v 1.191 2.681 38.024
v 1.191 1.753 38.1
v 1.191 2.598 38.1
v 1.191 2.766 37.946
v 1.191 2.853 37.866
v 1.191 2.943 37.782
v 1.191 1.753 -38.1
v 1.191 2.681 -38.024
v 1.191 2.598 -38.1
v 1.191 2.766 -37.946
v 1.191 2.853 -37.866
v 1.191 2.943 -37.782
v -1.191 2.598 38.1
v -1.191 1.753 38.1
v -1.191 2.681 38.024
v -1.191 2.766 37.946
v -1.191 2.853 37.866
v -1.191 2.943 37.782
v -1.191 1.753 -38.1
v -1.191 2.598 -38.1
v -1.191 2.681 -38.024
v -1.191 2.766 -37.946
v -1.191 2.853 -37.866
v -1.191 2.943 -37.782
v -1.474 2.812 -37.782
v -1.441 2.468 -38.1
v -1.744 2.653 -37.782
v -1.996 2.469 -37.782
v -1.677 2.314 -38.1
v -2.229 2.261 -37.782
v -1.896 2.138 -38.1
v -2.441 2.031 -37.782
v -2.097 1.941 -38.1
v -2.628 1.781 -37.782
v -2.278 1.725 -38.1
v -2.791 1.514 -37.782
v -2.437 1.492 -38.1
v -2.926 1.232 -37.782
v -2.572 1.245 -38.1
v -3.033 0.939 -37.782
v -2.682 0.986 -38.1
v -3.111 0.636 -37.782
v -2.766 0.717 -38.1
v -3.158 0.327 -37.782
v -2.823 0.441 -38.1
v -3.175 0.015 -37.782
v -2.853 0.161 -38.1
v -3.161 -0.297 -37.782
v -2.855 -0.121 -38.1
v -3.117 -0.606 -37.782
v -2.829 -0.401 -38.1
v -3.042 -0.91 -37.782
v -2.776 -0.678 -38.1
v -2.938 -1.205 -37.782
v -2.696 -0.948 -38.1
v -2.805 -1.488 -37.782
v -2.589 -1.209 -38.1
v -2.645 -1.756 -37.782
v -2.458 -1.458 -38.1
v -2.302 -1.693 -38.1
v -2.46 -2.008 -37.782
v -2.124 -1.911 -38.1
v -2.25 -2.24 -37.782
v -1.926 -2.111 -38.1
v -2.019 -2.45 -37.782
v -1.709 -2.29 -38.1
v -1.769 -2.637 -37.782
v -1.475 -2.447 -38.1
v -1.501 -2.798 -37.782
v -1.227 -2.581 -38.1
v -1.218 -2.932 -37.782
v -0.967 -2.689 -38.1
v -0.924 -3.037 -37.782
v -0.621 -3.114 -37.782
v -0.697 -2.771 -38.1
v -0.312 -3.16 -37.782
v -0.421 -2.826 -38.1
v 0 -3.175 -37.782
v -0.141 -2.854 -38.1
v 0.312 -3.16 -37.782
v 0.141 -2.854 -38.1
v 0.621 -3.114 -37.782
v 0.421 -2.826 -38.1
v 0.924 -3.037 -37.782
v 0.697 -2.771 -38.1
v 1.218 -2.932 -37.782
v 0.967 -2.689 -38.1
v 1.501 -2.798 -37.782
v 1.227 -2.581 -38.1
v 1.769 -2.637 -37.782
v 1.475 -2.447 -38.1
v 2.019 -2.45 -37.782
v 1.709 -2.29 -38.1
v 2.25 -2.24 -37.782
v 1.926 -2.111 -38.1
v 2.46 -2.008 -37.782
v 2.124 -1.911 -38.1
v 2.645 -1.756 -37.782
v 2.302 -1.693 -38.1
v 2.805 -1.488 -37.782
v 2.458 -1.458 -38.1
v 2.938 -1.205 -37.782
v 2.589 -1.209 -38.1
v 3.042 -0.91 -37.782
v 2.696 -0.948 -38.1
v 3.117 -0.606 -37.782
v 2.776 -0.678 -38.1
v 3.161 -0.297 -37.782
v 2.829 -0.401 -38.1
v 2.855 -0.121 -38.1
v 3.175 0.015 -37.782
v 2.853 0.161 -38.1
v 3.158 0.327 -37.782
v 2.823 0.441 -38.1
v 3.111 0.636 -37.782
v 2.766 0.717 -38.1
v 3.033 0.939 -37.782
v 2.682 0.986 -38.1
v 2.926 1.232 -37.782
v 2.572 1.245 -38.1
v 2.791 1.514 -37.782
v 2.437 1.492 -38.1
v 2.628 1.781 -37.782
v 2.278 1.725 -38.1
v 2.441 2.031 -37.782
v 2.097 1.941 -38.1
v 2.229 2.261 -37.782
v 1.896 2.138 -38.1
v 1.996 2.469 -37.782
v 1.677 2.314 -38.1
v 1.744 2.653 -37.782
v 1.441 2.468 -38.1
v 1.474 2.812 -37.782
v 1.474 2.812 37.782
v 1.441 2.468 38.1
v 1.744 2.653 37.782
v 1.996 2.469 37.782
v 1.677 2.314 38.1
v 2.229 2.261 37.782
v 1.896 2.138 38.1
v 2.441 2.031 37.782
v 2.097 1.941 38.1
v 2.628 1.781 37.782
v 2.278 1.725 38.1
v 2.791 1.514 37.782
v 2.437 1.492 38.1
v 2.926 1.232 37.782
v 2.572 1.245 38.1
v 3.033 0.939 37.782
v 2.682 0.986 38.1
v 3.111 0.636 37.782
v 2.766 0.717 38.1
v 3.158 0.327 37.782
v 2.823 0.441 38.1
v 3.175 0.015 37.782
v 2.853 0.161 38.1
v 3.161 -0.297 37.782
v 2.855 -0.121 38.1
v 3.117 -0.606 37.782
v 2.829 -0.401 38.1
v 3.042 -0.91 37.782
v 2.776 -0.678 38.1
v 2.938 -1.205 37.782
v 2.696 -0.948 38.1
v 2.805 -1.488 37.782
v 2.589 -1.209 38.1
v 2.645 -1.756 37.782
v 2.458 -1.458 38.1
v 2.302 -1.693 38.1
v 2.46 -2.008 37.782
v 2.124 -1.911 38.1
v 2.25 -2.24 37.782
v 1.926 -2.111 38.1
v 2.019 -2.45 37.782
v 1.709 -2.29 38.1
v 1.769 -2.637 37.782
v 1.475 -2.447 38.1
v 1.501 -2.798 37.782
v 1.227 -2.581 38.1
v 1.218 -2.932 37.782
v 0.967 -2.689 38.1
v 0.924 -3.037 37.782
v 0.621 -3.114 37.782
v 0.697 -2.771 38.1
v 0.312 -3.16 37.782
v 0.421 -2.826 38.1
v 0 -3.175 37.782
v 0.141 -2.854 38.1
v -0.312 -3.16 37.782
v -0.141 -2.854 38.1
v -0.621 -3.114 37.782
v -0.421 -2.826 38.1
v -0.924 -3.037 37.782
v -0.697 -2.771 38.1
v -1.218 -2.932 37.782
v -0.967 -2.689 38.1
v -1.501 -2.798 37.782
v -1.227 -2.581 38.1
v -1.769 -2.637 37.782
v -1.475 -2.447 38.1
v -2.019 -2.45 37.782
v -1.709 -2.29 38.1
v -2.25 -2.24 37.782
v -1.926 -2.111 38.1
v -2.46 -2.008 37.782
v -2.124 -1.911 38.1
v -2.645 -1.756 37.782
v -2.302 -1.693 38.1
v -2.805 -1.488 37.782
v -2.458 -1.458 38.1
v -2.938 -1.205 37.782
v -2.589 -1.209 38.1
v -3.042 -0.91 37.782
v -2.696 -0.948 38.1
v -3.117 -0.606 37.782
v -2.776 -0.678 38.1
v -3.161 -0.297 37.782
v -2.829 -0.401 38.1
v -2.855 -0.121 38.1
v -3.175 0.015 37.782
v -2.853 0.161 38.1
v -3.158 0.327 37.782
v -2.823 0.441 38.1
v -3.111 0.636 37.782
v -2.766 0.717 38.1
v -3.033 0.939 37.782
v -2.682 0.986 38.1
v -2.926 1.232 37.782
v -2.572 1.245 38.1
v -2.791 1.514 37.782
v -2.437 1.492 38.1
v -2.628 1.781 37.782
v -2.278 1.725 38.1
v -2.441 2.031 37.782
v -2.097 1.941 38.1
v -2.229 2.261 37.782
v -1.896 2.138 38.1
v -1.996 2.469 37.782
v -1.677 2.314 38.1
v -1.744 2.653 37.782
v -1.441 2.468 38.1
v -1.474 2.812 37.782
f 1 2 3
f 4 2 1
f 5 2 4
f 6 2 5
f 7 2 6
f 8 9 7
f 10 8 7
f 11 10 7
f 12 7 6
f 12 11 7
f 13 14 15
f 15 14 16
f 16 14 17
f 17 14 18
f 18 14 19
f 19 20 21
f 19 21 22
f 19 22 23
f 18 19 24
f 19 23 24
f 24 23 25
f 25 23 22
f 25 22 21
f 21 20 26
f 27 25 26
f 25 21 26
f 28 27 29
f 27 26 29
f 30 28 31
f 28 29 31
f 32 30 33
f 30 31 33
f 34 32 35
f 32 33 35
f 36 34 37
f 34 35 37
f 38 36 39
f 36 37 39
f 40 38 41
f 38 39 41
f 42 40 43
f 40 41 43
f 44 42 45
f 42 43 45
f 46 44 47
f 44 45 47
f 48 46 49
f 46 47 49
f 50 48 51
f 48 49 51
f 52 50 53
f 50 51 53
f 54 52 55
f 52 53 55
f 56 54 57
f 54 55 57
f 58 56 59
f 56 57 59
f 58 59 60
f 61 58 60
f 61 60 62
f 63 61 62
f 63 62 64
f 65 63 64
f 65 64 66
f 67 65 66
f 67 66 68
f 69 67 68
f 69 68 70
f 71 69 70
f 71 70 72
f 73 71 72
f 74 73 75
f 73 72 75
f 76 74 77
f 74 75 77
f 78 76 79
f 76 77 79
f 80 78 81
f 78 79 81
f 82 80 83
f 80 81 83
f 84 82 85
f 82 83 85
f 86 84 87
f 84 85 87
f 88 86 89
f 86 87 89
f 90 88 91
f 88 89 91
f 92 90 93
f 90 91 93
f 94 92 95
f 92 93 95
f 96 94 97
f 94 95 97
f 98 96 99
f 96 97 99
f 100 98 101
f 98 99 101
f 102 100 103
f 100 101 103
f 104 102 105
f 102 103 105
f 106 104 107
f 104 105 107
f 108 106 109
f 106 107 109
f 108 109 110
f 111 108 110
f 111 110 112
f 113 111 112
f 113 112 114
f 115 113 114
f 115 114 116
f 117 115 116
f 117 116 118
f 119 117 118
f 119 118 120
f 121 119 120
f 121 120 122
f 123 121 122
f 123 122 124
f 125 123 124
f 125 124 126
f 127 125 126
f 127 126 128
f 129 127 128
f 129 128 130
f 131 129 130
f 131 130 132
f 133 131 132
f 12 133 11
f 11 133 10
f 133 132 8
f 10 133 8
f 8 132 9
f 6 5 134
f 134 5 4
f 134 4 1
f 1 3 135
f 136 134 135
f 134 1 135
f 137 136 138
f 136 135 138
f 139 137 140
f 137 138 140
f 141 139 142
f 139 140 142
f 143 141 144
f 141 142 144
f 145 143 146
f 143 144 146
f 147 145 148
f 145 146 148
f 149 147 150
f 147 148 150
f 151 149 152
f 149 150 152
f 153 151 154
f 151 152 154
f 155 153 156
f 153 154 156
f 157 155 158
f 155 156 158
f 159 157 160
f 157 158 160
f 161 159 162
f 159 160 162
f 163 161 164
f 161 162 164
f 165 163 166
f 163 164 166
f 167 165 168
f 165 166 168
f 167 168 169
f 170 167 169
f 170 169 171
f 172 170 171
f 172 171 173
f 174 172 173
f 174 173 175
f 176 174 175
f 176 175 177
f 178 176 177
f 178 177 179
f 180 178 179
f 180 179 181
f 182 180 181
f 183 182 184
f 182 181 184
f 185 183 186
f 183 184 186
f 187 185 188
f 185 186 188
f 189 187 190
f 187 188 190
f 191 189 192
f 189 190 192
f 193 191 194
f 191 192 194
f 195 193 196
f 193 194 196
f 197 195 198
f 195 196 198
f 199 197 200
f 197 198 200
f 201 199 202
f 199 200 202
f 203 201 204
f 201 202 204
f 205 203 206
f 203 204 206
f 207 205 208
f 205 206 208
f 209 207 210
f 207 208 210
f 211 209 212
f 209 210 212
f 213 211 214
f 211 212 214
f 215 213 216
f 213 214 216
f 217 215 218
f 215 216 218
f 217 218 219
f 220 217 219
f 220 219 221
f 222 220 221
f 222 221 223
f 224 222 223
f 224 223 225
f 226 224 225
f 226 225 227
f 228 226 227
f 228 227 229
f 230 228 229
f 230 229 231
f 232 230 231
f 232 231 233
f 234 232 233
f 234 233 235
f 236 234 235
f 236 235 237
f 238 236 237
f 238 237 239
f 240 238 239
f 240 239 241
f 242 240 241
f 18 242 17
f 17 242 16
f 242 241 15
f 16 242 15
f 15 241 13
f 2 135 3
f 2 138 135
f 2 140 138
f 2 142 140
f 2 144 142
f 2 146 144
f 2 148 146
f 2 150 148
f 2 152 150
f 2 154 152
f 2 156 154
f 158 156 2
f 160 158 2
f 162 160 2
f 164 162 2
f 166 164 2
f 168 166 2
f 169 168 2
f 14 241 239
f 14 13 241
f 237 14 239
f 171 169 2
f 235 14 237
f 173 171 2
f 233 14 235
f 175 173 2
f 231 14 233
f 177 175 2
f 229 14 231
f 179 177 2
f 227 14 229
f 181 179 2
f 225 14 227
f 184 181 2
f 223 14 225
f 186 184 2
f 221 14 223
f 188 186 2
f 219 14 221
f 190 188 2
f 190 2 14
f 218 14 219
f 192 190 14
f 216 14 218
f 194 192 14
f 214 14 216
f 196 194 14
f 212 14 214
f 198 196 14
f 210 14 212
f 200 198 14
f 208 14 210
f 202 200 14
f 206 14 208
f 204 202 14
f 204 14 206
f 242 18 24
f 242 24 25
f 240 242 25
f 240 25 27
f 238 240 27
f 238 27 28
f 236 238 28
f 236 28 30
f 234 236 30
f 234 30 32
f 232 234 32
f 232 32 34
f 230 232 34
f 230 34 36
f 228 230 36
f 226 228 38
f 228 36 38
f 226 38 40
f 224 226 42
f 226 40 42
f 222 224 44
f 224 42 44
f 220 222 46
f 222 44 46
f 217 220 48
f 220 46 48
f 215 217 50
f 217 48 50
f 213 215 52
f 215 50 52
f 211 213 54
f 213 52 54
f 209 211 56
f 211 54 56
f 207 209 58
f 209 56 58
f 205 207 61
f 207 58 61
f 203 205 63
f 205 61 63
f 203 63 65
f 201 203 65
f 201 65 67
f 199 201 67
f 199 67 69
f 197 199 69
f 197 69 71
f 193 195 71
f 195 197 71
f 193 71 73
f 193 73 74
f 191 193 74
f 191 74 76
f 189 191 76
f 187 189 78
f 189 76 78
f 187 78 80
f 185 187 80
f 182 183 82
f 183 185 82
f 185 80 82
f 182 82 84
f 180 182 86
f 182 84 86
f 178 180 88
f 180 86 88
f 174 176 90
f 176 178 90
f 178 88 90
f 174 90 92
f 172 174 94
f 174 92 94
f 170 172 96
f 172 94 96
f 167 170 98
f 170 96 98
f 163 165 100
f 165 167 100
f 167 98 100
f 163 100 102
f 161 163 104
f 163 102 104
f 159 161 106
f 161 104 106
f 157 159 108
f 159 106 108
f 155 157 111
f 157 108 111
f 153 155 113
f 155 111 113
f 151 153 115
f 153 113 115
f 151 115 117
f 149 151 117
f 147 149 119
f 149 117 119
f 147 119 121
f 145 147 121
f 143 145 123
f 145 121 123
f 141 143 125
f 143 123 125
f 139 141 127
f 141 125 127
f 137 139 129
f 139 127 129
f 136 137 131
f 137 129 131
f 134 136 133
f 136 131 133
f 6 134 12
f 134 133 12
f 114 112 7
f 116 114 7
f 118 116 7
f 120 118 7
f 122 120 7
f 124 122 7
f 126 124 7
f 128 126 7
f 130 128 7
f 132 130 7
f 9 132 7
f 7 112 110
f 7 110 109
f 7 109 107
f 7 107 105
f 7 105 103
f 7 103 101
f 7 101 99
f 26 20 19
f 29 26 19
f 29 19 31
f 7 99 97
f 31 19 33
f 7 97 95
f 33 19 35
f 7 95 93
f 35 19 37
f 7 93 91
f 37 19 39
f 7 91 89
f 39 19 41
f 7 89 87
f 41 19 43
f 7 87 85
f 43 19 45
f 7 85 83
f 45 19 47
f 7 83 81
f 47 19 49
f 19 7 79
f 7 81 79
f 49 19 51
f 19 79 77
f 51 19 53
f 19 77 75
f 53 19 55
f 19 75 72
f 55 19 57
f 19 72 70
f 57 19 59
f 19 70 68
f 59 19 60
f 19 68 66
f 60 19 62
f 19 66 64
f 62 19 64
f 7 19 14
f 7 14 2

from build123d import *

# Parameters (mm, degrees)
BOSS_EXTRUDE2_DEPTH      = 38.1
BOSS_EXTRUDE2_DEPTH_BACK = 38.1
SKETCH3_R                = 3.175
CUT_EXTRUDE5_DEPTH       = 39.363670966
CUT_EXTRUDE5_DEPTH_BACK  = 39.363670966
SKETCH10_W               = 2.38125
SKETCH10_H               = 1.422321225
CHAMFER1_SIZE            = 0.3175


with BuildPart() as part:
    # Sketch3 → Boss-Extrude2 (new, two sides: drawn at the far end of the back side and taken through both)
    with BuildSketch(Plane.XY.offset(-BOSS_EXTRUDE2_DEPTH_BACK)):
        with Locations(Location((0, 0, 0), (0, 0, 180))):
            Circle(SKETCH3_R)
    extrude(amount=BOSS_EXTRUDE2_DEPTH + BOSS_EXTRUDE2_DEPTH_BACK)

    # Sketch10 → Cut-Extrude5 (cut, two sides: drawn at the far end of the back side and taken through both)
    with BuildSketch(Plane.XY.offset(-CUT_EXTRUDE5_DEPTH_BACK)):
        with Locations((0, 2.463839388)):
            Rectangle(SKETCH10_W, SKETCH10_H)
    extrude(amount=CUT_EXTRUDE5_DEPTH + CUT_EXTRUDE5_DEPTH_BACK, mode=Mode.SUBTRACT)

    # Chamfer1
    chamfer1_edges = [part.edges().sort_by_distance(p)[0] for p in [
        (0, -3.175, 38.1),
        (0, -3.175, -38.1),
    ]]
    chamfer(chamfer1_edges, length=CHAMFER1_SIZE)


solid = part.part
